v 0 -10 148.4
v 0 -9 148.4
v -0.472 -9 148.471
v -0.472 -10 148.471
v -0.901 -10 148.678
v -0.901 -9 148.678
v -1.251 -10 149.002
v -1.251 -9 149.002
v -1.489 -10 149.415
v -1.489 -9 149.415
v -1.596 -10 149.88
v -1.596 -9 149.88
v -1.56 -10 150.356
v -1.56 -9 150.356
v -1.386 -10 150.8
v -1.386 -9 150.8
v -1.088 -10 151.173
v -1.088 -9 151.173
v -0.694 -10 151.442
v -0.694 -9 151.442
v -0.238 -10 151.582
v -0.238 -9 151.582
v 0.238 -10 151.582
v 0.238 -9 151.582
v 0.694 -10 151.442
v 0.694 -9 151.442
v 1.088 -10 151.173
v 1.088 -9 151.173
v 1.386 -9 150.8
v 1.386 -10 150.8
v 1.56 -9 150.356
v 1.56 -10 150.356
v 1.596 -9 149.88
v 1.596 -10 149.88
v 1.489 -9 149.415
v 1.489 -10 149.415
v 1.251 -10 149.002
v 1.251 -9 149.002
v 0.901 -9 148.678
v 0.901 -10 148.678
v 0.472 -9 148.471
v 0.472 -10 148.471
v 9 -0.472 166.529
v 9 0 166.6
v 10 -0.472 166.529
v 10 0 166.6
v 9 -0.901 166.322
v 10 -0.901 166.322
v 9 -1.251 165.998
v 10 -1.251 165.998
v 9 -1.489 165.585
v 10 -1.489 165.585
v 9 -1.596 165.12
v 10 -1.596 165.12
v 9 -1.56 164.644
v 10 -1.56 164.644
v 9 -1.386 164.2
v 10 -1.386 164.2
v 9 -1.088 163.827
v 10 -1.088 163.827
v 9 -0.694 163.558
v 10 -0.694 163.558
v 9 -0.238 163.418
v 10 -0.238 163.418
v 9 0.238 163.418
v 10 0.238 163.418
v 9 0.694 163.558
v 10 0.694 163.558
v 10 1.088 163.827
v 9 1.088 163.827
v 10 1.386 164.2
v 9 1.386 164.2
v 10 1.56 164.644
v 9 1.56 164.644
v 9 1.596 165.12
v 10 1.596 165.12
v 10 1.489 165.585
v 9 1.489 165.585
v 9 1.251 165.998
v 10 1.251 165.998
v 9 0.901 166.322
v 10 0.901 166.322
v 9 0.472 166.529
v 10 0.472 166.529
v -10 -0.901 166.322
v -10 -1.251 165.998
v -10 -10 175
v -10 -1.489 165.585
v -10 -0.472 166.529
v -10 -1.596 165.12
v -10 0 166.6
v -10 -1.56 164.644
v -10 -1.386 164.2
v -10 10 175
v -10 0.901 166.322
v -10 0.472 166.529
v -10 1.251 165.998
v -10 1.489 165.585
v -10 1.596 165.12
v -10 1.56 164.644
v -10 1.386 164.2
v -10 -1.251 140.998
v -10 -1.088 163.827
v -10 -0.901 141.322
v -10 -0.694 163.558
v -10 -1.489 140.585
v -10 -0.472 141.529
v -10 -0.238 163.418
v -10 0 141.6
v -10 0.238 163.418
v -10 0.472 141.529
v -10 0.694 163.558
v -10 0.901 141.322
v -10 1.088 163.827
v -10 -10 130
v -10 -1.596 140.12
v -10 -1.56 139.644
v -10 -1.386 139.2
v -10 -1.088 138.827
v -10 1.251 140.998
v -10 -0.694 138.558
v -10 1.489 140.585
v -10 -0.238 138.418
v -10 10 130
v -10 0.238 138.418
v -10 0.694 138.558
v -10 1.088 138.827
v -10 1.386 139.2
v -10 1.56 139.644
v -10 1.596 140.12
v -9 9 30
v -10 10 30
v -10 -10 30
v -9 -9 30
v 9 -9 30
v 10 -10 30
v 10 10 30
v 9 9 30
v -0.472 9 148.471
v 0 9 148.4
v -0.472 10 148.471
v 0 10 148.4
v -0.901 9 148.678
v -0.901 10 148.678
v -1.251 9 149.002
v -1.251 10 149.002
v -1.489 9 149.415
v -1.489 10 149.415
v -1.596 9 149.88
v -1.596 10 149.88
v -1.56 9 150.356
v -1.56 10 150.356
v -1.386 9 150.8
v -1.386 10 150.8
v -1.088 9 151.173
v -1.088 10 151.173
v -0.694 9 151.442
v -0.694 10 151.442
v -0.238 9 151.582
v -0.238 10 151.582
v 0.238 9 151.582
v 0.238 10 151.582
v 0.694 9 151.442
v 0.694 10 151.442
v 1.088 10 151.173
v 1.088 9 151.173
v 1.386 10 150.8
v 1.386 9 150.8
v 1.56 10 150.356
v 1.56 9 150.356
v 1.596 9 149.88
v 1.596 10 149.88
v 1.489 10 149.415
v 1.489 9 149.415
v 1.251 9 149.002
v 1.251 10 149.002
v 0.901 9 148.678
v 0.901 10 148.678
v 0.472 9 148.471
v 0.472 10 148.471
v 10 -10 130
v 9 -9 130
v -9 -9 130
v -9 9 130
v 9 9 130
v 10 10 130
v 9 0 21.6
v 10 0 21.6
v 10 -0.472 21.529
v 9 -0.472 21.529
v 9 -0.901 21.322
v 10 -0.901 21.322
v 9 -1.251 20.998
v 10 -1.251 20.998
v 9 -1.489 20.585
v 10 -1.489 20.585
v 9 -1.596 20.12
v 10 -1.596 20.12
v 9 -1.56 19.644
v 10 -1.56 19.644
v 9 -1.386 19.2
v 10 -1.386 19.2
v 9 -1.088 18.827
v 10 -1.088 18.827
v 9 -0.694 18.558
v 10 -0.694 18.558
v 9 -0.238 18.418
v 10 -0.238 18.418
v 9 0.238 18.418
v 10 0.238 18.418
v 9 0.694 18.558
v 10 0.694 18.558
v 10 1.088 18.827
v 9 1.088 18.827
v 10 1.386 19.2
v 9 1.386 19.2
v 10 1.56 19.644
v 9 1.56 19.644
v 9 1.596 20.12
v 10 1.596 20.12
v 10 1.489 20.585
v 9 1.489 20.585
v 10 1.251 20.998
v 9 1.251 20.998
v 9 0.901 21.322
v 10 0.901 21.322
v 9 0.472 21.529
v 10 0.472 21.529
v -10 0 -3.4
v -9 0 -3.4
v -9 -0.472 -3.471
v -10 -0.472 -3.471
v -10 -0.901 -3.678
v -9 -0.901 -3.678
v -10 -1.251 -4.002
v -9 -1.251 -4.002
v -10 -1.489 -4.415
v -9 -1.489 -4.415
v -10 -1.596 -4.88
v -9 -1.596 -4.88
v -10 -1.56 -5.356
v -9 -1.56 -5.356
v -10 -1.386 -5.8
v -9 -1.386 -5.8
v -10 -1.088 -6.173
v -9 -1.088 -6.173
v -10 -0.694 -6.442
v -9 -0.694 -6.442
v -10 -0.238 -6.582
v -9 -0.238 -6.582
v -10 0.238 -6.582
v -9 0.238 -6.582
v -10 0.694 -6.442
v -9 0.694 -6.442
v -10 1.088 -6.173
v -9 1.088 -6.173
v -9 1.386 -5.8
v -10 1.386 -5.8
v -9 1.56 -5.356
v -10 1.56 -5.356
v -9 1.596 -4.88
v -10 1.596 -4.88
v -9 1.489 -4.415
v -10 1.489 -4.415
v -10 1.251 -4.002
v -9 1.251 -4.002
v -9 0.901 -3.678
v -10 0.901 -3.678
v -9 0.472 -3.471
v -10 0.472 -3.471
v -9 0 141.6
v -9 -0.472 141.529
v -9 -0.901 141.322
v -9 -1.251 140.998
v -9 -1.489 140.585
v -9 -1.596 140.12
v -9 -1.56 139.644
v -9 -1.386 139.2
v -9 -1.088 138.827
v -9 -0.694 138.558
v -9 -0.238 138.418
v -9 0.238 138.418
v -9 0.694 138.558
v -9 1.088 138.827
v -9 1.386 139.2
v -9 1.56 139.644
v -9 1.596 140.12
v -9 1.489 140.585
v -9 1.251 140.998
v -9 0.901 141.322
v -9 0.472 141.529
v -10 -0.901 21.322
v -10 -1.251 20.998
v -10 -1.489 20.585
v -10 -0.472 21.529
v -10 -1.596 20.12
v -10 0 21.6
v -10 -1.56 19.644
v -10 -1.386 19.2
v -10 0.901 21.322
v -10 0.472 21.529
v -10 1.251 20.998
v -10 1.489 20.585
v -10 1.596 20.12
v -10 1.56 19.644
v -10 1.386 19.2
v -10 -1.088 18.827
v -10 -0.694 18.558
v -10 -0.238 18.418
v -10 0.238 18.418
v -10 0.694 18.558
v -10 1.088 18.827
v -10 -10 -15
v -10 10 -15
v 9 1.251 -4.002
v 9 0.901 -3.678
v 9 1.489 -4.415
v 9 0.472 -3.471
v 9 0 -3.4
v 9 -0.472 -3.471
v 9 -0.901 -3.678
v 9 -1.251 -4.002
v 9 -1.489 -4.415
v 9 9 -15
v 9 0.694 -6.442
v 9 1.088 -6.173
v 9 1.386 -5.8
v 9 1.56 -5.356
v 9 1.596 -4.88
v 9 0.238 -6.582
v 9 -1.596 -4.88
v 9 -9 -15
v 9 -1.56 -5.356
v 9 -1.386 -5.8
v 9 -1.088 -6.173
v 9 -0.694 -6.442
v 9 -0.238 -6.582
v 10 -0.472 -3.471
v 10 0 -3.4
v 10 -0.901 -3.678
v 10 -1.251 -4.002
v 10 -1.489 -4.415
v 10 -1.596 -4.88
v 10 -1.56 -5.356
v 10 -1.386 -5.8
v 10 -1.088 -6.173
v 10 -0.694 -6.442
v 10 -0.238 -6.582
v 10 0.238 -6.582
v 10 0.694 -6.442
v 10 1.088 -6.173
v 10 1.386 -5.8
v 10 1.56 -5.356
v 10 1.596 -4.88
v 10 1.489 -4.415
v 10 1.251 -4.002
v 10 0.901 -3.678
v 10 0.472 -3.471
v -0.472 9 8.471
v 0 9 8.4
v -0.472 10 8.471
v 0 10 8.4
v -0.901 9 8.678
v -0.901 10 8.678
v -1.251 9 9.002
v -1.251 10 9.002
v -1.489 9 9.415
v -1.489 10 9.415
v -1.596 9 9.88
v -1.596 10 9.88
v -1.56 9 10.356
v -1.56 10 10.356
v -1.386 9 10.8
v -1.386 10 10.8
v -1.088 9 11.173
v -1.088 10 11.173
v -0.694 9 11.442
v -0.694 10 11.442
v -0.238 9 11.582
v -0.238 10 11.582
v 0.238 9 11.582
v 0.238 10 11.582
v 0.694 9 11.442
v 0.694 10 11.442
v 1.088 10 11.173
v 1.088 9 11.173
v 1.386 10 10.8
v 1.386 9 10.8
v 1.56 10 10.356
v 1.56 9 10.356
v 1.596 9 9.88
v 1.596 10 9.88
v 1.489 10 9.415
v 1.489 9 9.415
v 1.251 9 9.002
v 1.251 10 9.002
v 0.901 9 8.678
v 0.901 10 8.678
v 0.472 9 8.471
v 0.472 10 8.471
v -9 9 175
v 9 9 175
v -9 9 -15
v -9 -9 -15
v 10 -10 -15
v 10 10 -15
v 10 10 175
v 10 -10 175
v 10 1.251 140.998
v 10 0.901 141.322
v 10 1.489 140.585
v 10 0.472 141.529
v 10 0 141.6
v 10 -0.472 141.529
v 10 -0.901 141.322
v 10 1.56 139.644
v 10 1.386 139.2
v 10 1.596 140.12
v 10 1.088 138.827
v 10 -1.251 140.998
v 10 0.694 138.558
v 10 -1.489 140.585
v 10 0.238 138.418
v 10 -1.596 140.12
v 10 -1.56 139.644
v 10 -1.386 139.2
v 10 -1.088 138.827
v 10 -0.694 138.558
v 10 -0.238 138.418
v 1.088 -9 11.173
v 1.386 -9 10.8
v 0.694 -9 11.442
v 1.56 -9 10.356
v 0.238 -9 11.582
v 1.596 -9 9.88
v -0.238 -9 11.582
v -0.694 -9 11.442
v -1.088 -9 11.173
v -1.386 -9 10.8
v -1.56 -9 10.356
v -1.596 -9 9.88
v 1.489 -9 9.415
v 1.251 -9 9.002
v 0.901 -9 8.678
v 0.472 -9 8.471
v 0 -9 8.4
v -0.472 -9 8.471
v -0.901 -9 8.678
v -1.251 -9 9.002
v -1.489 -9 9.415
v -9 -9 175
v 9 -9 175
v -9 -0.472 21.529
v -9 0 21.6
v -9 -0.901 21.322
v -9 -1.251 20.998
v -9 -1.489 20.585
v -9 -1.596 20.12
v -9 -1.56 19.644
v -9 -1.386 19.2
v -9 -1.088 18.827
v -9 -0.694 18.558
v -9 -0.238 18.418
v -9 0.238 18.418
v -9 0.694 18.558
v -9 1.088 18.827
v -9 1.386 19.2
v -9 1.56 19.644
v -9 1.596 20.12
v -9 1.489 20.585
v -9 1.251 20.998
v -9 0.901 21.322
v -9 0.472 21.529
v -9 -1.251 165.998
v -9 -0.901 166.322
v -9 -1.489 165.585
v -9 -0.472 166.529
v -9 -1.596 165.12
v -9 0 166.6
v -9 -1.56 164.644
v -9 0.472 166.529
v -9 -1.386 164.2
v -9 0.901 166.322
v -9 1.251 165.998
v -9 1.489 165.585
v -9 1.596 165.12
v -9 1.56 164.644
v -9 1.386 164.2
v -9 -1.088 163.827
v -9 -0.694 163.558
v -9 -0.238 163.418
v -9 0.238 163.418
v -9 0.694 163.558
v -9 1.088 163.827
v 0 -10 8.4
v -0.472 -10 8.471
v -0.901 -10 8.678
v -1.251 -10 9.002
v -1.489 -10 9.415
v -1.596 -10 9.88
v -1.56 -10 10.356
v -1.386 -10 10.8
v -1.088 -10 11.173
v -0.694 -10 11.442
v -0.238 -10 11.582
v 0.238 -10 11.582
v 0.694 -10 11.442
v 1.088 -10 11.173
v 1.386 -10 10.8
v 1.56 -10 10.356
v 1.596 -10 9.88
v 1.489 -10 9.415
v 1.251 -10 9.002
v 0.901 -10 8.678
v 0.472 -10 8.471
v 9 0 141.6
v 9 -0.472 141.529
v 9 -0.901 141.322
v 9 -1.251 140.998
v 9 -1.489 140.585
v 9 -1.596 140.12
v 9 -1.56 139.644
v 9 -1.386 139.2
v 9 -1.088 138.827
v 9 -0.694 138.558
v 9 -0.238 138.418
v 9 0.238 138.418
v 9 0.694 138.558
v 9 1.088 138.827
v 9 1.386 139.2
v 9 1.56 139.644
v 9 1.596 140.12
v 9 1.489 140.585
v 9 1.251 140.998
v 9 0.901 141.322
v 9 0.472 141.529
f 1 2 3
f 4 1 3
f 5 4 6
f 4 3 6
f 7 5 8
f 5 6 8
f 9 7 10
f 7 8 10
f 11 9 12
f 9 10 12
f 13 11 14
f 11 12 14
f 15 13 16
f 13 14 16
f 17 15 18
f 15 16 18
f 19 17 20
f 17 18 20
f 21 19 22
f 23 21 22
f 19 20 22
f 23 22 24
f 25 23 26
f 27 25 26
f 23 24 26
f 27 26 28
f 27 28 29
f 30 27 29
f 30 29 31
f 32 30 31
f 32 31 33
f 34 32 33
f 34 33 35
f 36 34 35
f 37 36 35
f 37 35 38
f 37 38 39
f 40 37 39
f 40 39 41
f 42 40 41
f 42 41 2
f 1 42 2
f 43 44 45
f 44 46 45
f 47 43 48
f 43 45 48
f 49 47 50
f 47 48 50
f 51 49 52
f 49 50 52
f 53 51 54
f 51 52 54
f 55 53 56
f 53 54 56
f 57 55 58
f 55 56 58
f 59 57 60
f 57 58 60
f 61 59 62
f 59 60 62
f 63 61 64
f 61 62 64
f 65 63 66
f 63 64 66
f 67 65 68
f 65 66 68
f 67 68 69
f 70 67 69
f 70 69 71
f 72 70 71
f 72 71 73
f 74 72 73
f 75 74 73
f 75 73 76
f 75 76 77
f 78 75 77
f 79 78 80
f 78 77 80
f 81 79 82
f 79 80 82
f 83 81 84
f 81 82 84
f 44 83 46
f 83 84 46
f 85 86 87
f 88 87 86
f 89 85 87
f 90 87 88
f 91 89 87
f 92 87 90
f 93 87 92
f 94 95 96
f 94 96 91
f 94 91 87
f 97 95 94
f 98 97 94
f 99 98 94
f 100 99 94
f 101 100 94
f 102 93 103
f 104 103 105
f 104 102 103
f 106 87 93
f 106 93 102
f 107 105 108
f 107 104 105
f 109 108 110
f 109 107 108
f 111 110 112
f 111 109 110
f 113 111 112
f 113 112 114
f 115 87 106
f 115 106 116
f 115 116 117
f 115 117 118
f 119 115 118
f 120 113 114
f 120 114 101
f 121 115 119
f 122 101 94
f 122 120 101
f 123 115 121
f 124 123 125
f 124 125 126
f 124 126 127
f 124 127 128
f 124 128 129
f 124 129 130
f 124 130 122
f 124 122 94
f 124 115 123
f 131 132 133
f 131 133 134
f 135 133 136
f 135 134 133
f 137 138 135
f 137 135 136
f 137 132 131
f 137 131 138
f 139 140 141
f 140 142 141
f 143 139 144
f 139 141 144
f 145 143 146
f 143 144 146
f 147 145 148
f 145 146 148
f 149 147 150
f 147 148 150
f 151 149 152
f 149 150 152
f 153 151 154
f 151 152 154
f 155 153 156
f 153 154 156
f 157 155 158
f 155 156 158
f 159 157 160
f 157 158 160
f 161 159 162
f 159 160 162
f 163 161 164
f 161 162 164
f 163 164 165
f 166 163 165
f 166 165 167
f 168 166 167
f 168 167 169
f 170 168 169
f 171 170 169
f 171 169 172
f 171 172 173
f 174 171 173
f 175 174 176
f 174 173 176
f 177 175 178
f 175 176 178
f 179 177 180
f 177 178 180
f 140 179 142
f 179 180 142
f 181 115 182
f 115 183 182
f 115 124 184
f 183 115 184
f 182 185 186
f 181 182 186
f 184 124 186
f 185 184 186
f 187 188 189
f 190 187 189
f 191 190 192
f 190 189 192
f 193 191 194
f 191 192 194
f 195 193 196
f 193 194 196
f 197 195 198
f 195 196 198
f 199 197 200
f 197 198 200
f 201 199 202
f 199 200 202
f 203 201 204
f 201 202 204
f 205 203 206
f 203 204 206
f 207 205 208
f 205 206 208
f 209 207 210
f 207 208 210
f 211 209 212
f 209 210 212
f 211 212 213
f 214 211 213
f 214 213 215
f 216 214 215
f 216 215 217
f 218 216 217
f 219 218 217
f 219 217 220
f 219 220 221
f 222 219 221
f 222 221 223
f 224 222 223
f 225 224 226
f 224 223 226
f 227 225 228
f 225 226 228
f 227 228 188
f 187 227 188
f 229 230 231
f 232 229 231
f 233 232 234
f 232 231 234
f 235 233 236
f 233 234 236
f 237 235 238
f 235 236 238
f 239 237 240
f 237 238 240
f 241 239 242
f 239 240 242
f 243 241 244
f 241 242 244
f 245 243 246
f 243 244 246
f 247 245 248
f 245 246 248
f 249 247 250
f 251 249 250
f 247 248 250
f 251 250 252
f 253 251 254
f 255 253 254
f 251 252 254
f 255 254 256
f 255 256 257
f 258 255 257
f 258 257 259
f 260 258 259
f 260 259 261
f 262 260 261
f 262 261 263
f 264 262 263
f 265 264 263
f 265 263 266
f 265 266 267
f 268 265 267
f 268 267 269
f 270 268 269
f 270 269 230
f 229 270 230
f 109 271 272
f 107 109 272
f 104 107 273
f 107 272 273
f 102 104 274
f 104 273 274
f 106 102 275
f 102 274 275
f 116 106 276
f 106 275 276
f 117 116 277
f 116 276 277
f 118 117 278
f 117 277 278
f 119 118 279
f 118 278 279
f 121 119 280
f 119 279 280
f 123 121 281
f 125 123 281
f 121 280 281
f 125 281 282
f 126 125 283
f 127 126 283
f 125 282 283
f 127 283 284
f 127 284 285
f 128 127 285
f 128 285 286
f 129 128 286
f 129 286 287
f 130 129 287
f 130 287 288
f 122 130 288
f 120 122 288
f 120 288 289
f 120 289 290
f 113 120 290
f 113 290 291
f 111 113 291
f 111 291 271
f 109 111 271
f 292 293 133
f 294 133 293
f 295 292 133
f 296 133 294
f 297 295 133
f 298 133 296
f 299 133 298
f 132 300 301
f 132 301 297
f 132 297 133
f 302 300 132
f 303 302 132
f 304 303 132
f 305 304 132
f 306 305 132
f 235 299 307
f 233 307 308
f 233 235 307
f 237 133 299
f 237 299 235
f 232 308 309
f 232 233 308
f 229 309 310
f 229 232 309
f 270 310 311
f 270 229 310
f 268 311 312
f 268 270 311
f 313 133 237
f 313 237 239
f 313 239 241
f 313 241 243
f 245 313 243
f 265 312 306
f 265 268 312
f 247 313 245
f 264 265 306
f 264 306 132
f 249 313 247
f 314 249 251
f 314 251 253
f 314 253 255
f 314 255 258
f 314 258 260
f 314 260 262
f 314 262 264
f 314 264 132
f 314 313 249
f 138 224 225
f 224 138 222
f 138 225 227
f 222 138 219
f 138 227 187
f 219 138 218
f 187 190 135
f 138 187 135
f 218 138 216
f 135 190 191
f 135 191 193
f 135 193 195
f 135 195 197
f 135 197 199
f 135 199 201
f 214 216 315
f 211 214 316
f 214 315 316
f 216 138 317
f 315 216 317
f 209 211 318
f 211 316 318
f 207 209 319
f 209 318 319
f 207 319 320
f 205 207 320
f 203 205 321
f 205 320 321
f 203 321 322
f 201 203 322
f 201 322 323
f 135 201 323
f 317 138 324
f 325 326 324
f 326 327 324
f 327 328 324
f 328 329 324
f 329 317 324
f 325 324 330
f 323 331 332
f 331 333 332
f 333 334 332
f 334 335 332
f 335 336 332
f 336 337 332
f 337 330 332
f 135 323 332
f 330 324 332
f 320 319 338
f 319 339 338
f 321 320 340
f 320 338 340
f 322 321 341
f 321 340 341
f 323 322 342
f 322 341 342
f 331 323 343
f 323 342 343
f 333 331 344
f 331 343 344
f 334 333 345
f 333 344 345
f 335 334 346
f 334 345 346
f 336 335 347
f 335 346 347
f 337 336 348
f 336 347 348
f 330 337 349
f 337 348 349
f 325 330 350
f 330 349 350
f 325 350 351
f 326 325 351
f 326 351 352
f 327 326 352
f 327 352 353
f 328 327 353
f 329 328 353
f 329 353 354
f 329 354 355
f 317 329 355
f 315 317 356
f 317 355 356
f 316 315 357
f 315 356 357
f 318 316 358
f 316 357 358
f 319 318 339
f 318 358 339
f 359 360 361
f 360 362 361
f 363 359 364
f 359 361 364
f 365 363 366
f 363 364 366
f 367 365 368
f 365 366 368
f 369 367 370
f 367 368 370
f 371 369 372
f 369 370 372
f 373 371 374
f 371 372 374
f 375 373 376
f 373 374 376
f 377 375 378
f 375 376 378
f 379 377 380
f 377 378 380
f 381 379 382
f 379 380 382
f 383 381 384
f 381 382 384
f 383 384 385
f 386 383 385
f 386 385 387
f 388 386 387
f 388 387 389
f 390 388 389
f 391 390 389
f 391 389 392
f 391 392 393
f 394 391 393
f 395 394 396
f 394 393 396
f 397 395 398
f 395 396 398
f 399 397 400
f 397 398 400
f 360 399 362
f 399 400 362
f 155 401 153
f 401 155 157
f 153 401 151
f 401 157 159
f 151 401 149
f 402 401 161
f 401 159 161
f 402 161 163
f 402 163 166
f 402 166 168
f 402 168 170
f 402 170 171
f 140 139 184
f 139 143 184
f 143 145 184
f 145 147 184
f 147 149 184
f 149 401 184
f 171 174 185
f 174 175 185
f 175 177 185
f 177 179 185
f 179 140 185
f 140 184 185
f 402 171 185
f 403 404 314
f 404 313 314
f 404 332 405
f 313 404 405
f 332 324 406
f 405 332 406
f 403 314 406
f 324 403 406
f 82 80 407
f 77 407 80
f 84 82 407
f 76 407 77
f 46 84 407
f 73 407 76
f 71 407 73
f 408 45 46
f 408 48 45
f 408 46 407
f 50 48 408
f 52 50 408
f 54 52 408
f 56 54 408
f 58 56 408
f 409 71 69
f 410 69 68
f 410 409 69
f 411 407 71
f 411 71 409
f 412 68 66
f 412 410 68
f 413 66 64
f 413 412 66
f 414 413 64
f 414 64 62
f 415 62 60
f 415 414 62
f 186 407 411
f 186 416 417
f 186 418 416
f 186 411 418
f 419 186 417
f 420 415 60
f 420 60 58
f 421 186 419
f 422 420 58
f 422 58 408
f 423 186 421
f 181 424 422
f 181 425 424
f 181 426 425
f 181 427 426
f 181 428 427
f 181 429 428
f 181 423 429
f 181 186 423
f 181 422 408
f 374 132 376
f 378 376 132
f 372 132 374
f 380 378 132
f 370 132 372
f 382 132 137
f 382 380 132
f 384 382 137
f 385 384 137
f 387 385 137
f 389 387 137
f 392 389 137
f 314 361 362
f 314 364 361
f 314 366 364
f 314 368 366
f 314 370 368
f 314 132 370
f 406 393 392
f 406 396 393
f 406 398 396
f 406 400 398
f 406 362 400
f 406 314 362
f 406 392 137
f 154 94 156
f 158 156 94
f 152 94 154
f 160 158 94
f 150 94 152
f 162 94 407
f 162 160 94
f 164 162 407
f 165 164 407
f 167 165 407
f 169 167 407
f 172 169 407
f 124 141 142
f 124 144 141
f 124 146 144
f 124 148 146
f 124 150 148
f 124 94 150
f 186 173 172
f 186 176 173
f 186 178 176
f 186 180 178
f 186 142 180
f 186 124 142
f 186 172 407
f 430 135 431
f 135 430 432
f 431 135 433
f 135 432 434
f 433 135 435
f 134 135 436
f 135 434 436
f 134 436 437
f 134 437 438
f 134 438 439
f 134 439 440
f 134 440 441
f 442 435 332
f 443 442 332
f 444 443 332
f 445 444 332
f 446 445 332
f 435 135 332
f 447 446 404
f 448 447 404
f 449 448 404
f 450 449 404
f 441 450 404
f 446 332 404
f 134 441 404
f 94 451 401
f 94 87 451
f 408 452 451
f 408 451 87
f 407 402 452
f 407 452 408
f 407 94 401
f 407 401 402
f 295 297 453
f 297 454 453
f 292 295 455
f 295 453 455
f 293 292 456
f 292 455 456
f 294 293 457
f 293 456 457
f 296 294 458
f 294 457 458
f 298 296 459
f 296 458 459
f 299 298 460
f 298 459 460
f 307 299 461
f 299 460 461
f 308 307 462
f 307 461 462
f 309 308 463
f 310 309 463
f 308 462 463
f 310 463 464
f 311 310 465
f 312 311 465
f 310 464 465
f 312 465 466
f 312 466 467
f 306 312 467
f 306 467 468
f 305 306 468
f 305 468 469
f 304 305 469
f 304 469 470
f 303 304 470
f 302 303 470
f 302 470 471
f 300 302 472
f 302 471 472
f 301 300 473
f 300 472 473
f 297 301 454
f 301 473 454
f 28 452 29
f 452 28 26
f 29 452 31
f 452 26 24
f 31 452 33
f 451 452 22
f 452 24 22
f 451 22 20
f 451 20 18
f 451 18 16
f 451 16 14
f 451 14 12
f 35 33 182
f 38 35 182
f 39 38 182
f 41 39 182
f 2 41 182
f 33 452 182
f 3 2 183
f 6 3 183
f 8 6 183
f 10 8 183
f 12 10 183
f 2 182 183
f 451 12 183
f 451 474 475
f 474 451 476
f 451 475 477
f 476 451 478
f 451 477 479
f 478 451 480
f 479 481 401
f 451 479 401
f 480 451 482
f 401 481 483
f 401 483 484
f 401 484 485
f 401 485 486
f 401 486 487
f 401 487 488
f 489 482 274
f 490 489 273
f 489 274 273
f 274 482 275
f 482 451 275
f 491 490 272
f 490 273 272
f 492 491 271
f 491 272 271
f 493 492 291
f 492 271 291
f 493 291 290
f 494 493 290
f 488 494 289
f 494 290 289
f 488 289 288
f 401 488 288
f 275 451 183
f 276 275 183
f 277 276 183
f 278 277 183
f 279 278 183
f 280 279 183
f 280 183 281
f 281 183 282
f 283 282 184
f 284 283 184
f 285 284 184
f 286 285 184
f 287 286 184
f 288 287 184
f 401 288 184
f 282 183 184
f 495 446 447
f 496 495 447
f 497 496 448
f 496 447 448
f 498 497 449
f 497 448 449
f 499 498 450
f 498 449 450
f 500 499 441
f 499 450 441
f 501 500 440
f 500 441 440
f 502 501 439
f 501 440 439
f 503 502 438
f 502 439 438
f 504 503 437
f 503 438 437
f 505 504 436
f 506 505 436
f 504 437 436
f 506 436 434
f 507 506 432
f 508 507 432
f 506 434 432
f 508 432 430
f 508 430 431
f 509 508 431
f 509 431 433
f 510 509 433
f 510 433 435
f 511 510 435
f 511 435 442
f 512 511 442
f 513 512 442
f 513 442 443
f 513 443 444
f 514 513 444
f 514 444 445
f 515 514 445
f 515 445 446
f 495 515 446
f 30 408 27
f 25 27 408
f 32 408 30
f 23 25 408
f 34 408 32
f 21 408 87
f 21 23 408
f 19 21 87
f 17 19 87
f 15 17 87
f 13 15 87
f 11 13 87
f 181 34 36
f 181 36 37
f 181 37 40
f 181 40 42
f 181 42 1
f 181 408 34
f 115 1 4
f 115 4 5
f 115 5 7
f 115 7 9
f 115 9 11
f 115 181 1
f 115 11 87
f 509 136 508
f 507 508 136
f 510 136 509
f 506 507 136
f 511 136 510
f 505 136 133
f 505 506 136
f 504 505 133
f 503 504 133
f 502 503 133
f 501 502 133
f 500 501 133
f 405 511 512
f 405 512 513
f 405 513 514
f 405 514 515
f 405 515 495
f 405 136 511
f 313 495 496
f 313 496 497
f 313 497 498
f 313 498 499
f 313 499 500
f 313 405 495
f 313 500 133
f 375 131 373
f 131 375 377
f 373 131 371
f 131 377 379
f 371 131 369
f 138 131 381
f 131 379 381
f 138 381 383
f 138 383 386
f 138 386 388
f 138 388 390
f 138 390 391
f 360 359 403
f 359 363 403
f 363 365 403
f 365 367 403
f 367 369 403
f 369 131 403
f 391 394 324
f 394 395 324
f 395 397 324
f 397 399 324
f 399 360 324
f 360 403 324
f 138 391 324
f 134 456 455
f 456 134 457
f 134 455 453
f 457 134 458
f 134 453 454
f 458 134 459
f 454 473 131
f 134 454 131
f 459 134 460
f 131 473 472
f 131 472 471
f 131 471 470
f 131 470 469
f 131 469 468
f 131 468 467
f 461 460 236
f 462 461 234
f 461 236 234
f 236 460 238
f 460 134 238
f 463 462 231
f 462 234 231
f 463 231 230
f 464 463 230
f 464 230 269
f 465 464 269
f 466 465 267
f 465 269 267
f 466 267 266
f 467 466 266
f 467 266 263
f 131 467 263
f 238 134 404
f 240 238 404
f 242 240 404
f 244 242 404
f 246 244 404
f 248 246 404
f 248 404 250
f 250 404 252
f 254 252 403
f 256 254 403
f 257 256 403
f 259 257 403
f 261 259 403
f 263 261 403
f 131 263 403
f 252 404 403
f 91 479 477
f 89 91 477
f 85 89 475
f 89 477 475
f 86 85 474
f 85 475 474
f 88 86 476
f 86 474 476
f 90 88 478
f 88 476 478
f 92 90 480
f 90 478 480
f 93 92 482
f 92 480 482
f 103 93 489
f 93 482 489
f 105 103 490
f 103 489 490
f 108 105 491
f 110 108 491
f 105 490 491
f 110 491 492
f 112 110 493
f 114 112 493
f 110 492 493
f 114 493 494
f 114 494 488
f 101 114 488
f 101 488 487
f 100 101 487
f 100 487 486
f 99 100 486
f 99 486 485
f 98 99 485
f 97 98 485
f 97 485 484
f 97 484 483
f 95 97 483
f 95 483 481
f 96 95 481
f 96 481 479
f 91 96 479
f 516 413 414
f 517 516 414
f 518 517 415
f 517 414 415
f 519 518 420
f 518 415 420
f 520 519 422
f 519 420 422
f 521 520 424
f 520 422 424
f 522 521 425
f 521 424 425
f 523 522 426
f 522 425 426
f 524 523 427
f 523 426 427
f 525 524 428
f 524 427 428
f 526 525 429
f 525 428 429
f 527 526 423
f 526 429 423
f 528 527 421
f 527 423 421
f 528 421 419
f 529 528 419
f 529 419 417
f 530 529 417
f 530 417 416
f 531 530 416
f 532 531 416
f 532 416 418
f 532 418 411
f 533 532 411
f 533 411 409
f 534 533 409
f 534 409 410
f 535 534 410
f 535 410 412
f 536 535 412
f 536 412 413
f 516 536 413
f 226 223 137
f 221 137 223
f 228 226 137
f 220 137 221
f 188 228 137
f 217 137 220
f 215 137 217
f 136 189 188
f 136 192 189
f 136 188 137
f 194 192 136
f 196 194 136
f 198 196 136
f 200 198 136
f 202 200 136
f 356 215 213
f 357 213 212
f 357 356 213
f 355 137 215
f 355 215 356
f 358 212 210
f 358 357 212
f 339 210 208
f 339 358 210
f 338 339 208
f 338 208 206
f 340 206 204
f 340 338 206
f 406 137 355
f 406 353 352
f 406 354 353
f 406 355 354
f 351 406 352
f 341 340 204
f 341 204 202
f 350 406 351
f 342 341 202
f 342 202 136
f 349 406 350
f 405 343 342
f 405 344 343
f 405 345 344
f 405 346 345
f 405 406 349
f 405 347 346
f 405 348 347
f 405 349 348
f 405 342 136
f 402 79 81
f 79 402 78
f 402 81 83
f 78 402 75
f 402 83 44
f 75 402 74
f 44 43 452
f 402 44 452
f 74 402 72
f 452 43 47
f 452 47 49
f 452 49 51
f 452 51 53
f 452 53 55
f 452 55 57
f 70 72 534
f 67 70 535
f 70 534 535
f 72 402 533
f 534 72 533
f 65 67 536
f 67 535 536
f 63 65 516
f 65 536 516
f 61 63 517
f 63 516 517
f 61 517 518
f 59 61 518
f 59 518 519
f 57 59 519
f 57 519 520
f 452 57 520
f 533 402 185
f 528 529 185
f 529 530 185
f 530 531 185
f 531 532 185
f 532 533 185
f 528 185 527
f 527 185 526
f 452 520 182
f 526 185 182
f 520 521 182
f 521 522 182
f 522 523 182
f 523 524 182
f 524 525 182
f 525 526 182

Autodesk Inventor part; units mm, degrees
ref_plane "YZ Plane" through (0, 0, 0) normal (1, 0, 0) x (0, 1, 0)
ref_plane "XZ Plane" through (0, 0, 0) normal (0, 1, 0) x (-1, 0, 0)
ref_plane "XY Plane" through (0, 0, 0) normal (0, 0, 1) x (1, 0, 0)
ref_plane "作業平面2" through (7.5, -7.5, 160) normal (1, 0, 0) x (0, 0, -1)
ref_plane "作業平面1" through (7.5, -7.5, 80) normal (0, 0, 1) x (1, 0, 0)
sketch "スケッチ2" plane through (7.5, -7.5, 80) normal (0, 0, 1) x (1, 0, 0)
  line L0 (-17.5, 17.5) -> (2.5, 17.5)
  line L1 (2.5, 17.5) -> (2.5, -2.5)
  line L2 (2.5, -2.5) -> (-17.5, -2.5)
  line L3 (-17.5, -2.5) -> (-17.5, 17.5)
  line L4 (-17.5, 17.5) -> (2.5, -2.5) construction
  line L5 (2.5, 17.5) -> (-17.5, -2.5) construction
  point P0 (-7.5, 7.5)
  dimension "d4" = 20
  dimension "d5" = 20
extrude "押し出し2" add sketch "スケッチ2" along normal mid plane 190
shell "シェル1" thickness 1 removed faces 2 at (3.3333, -3.3333, 175) at (-3.3333, 3.3333, -15)
ref_plane "作業平面3" through (-7.5, -7.5, -15) normal (-1, 0, 0) x (0, 0, 1)
sketch "スケッチ3" plane through (-10, -7.5, -15) normal (-1, 0, 0) x (0, 0, 1)
  line L0 (155, 7.5) -> (35, 7.5)
  line L1 (190, -2.5) -> (0, -2.5) projected
  line L2 (190, 17.5) -> (190, -2.5) projected
  point P0 (95, -2.5)
  point P1 (95, 7.5)
  point P2 (190, 7.5)
  dimension "d38" = 120
hole "穴1" at (-10, 0, 140) at (-10, 0, 20) direction (1, 0, 0) diameter 3.2 end through all
ref_plane "作業平面4" through (-7.5, -7.5, -15) normal (0, -1, 0) x (1, 0, 0)
sketch "スケッチ4" plane through (-7.5, -10, -15) normal (0, -1, 0) x (1, 0, 0)
  line L0 (17.5, 190) -> (17.5, 0) projected
  line L1 (-2.5, 190) -> (17.5, 190) projected
  line L2 (-2.5, 190) -> (-2.5, 0) projected
  line L3 (17.5, 0) -> (-2.5, 0) projected
  line L4 (7.5, 165) -> (7.5, 25)
  line L5 (17.5, 190) -> (17.5, 0) projected
  line L6 (-2.5, 190) -> (17.5, 190) projected
  point P0 (17.5, 95)
  point P1 (7.5, 95)
  point P2 (7.5, 190)
  dimension "d39" = 140
hole "穴2" at (0, -10, 150) at (0, -10, 10) direction (0, 1, 0) diameter 3.2 end through all
sketch "スケッチ5" plane through (7.5, -7.5, 80) normal (0, 0, 1) x (1, 0, 0)
  line L0 (2.5, 17.5) -> (-17.5, 17.5)
  line L1 (-17.5, 17.5) -> (-17.5, -2.5)
  line L2 (-17.5, -2.5) -> (2.5, -2.5)
  line L3 (2.5, -2.5) -> (2.5, 17.5)
  line L4 (2.5, 17.5) -> (-17.5, -2.5) construction
  line L5 (-17.5, 17.5) -> (2.5, -2.5) construction
  point P0 (-7.5, 7.5)
  dimension "d25" = 20
  dimension "d26" = 20
extrude "押し出し3" cut sketch "スケッチ5" along normal mid plane 100
ref_plane "作業平面5" through (-7.5, -7.5, 175) normal (-1, 0, 0) x (0, 0, 1)
sketch "スケッチ6" plane through (-10, -7.5, 175) normal (-1, 0, 0) x (0, 0, 1)
  line L0 (-45, 17.5) -> (-45, -2.5) projected
  line L1 (0, -2.5) -> (-45, -2.5) projected
  line L2 (0, 17.5) -> (0, -2.5) projected
  line L3 (-45, 17.5) -> (0, 17.5) projected
  circle A0 centre (-35, 7.5) radius 1.6 projected
  circle A1 centre (-155, 7.5) radius 1.6 projected
  line L4 (-145, -2.5) -> (-145, 17.5) projected
  line L5 (-190, 17.5) -> (-145, 17.5) projected
  line L6 (-190, -2.5) -> (-190, 17.5) projected
  line L7 (-145, -2.5) -> (-190, -2.5) projected
  line L8 (-10, 7.5) -> (-180, 7.5)
  line L9 (0, 17.5) -> (0, -2.5) projected
  line L10 (-190, -2.5) -> (-190, 17.5) projected
  point P0 (0, 7.5)
  dimension "d40" = 10
  dimension "d41" = 10
hole "穴3" at (-10, 0, 165) at (-10, 0, -5) direction (1, 0, 0) diameter 3.2 end through all
equation "\"d5\" = d4"
equation "\"d26\" = d25"
properties part number "ロボベース□15"
